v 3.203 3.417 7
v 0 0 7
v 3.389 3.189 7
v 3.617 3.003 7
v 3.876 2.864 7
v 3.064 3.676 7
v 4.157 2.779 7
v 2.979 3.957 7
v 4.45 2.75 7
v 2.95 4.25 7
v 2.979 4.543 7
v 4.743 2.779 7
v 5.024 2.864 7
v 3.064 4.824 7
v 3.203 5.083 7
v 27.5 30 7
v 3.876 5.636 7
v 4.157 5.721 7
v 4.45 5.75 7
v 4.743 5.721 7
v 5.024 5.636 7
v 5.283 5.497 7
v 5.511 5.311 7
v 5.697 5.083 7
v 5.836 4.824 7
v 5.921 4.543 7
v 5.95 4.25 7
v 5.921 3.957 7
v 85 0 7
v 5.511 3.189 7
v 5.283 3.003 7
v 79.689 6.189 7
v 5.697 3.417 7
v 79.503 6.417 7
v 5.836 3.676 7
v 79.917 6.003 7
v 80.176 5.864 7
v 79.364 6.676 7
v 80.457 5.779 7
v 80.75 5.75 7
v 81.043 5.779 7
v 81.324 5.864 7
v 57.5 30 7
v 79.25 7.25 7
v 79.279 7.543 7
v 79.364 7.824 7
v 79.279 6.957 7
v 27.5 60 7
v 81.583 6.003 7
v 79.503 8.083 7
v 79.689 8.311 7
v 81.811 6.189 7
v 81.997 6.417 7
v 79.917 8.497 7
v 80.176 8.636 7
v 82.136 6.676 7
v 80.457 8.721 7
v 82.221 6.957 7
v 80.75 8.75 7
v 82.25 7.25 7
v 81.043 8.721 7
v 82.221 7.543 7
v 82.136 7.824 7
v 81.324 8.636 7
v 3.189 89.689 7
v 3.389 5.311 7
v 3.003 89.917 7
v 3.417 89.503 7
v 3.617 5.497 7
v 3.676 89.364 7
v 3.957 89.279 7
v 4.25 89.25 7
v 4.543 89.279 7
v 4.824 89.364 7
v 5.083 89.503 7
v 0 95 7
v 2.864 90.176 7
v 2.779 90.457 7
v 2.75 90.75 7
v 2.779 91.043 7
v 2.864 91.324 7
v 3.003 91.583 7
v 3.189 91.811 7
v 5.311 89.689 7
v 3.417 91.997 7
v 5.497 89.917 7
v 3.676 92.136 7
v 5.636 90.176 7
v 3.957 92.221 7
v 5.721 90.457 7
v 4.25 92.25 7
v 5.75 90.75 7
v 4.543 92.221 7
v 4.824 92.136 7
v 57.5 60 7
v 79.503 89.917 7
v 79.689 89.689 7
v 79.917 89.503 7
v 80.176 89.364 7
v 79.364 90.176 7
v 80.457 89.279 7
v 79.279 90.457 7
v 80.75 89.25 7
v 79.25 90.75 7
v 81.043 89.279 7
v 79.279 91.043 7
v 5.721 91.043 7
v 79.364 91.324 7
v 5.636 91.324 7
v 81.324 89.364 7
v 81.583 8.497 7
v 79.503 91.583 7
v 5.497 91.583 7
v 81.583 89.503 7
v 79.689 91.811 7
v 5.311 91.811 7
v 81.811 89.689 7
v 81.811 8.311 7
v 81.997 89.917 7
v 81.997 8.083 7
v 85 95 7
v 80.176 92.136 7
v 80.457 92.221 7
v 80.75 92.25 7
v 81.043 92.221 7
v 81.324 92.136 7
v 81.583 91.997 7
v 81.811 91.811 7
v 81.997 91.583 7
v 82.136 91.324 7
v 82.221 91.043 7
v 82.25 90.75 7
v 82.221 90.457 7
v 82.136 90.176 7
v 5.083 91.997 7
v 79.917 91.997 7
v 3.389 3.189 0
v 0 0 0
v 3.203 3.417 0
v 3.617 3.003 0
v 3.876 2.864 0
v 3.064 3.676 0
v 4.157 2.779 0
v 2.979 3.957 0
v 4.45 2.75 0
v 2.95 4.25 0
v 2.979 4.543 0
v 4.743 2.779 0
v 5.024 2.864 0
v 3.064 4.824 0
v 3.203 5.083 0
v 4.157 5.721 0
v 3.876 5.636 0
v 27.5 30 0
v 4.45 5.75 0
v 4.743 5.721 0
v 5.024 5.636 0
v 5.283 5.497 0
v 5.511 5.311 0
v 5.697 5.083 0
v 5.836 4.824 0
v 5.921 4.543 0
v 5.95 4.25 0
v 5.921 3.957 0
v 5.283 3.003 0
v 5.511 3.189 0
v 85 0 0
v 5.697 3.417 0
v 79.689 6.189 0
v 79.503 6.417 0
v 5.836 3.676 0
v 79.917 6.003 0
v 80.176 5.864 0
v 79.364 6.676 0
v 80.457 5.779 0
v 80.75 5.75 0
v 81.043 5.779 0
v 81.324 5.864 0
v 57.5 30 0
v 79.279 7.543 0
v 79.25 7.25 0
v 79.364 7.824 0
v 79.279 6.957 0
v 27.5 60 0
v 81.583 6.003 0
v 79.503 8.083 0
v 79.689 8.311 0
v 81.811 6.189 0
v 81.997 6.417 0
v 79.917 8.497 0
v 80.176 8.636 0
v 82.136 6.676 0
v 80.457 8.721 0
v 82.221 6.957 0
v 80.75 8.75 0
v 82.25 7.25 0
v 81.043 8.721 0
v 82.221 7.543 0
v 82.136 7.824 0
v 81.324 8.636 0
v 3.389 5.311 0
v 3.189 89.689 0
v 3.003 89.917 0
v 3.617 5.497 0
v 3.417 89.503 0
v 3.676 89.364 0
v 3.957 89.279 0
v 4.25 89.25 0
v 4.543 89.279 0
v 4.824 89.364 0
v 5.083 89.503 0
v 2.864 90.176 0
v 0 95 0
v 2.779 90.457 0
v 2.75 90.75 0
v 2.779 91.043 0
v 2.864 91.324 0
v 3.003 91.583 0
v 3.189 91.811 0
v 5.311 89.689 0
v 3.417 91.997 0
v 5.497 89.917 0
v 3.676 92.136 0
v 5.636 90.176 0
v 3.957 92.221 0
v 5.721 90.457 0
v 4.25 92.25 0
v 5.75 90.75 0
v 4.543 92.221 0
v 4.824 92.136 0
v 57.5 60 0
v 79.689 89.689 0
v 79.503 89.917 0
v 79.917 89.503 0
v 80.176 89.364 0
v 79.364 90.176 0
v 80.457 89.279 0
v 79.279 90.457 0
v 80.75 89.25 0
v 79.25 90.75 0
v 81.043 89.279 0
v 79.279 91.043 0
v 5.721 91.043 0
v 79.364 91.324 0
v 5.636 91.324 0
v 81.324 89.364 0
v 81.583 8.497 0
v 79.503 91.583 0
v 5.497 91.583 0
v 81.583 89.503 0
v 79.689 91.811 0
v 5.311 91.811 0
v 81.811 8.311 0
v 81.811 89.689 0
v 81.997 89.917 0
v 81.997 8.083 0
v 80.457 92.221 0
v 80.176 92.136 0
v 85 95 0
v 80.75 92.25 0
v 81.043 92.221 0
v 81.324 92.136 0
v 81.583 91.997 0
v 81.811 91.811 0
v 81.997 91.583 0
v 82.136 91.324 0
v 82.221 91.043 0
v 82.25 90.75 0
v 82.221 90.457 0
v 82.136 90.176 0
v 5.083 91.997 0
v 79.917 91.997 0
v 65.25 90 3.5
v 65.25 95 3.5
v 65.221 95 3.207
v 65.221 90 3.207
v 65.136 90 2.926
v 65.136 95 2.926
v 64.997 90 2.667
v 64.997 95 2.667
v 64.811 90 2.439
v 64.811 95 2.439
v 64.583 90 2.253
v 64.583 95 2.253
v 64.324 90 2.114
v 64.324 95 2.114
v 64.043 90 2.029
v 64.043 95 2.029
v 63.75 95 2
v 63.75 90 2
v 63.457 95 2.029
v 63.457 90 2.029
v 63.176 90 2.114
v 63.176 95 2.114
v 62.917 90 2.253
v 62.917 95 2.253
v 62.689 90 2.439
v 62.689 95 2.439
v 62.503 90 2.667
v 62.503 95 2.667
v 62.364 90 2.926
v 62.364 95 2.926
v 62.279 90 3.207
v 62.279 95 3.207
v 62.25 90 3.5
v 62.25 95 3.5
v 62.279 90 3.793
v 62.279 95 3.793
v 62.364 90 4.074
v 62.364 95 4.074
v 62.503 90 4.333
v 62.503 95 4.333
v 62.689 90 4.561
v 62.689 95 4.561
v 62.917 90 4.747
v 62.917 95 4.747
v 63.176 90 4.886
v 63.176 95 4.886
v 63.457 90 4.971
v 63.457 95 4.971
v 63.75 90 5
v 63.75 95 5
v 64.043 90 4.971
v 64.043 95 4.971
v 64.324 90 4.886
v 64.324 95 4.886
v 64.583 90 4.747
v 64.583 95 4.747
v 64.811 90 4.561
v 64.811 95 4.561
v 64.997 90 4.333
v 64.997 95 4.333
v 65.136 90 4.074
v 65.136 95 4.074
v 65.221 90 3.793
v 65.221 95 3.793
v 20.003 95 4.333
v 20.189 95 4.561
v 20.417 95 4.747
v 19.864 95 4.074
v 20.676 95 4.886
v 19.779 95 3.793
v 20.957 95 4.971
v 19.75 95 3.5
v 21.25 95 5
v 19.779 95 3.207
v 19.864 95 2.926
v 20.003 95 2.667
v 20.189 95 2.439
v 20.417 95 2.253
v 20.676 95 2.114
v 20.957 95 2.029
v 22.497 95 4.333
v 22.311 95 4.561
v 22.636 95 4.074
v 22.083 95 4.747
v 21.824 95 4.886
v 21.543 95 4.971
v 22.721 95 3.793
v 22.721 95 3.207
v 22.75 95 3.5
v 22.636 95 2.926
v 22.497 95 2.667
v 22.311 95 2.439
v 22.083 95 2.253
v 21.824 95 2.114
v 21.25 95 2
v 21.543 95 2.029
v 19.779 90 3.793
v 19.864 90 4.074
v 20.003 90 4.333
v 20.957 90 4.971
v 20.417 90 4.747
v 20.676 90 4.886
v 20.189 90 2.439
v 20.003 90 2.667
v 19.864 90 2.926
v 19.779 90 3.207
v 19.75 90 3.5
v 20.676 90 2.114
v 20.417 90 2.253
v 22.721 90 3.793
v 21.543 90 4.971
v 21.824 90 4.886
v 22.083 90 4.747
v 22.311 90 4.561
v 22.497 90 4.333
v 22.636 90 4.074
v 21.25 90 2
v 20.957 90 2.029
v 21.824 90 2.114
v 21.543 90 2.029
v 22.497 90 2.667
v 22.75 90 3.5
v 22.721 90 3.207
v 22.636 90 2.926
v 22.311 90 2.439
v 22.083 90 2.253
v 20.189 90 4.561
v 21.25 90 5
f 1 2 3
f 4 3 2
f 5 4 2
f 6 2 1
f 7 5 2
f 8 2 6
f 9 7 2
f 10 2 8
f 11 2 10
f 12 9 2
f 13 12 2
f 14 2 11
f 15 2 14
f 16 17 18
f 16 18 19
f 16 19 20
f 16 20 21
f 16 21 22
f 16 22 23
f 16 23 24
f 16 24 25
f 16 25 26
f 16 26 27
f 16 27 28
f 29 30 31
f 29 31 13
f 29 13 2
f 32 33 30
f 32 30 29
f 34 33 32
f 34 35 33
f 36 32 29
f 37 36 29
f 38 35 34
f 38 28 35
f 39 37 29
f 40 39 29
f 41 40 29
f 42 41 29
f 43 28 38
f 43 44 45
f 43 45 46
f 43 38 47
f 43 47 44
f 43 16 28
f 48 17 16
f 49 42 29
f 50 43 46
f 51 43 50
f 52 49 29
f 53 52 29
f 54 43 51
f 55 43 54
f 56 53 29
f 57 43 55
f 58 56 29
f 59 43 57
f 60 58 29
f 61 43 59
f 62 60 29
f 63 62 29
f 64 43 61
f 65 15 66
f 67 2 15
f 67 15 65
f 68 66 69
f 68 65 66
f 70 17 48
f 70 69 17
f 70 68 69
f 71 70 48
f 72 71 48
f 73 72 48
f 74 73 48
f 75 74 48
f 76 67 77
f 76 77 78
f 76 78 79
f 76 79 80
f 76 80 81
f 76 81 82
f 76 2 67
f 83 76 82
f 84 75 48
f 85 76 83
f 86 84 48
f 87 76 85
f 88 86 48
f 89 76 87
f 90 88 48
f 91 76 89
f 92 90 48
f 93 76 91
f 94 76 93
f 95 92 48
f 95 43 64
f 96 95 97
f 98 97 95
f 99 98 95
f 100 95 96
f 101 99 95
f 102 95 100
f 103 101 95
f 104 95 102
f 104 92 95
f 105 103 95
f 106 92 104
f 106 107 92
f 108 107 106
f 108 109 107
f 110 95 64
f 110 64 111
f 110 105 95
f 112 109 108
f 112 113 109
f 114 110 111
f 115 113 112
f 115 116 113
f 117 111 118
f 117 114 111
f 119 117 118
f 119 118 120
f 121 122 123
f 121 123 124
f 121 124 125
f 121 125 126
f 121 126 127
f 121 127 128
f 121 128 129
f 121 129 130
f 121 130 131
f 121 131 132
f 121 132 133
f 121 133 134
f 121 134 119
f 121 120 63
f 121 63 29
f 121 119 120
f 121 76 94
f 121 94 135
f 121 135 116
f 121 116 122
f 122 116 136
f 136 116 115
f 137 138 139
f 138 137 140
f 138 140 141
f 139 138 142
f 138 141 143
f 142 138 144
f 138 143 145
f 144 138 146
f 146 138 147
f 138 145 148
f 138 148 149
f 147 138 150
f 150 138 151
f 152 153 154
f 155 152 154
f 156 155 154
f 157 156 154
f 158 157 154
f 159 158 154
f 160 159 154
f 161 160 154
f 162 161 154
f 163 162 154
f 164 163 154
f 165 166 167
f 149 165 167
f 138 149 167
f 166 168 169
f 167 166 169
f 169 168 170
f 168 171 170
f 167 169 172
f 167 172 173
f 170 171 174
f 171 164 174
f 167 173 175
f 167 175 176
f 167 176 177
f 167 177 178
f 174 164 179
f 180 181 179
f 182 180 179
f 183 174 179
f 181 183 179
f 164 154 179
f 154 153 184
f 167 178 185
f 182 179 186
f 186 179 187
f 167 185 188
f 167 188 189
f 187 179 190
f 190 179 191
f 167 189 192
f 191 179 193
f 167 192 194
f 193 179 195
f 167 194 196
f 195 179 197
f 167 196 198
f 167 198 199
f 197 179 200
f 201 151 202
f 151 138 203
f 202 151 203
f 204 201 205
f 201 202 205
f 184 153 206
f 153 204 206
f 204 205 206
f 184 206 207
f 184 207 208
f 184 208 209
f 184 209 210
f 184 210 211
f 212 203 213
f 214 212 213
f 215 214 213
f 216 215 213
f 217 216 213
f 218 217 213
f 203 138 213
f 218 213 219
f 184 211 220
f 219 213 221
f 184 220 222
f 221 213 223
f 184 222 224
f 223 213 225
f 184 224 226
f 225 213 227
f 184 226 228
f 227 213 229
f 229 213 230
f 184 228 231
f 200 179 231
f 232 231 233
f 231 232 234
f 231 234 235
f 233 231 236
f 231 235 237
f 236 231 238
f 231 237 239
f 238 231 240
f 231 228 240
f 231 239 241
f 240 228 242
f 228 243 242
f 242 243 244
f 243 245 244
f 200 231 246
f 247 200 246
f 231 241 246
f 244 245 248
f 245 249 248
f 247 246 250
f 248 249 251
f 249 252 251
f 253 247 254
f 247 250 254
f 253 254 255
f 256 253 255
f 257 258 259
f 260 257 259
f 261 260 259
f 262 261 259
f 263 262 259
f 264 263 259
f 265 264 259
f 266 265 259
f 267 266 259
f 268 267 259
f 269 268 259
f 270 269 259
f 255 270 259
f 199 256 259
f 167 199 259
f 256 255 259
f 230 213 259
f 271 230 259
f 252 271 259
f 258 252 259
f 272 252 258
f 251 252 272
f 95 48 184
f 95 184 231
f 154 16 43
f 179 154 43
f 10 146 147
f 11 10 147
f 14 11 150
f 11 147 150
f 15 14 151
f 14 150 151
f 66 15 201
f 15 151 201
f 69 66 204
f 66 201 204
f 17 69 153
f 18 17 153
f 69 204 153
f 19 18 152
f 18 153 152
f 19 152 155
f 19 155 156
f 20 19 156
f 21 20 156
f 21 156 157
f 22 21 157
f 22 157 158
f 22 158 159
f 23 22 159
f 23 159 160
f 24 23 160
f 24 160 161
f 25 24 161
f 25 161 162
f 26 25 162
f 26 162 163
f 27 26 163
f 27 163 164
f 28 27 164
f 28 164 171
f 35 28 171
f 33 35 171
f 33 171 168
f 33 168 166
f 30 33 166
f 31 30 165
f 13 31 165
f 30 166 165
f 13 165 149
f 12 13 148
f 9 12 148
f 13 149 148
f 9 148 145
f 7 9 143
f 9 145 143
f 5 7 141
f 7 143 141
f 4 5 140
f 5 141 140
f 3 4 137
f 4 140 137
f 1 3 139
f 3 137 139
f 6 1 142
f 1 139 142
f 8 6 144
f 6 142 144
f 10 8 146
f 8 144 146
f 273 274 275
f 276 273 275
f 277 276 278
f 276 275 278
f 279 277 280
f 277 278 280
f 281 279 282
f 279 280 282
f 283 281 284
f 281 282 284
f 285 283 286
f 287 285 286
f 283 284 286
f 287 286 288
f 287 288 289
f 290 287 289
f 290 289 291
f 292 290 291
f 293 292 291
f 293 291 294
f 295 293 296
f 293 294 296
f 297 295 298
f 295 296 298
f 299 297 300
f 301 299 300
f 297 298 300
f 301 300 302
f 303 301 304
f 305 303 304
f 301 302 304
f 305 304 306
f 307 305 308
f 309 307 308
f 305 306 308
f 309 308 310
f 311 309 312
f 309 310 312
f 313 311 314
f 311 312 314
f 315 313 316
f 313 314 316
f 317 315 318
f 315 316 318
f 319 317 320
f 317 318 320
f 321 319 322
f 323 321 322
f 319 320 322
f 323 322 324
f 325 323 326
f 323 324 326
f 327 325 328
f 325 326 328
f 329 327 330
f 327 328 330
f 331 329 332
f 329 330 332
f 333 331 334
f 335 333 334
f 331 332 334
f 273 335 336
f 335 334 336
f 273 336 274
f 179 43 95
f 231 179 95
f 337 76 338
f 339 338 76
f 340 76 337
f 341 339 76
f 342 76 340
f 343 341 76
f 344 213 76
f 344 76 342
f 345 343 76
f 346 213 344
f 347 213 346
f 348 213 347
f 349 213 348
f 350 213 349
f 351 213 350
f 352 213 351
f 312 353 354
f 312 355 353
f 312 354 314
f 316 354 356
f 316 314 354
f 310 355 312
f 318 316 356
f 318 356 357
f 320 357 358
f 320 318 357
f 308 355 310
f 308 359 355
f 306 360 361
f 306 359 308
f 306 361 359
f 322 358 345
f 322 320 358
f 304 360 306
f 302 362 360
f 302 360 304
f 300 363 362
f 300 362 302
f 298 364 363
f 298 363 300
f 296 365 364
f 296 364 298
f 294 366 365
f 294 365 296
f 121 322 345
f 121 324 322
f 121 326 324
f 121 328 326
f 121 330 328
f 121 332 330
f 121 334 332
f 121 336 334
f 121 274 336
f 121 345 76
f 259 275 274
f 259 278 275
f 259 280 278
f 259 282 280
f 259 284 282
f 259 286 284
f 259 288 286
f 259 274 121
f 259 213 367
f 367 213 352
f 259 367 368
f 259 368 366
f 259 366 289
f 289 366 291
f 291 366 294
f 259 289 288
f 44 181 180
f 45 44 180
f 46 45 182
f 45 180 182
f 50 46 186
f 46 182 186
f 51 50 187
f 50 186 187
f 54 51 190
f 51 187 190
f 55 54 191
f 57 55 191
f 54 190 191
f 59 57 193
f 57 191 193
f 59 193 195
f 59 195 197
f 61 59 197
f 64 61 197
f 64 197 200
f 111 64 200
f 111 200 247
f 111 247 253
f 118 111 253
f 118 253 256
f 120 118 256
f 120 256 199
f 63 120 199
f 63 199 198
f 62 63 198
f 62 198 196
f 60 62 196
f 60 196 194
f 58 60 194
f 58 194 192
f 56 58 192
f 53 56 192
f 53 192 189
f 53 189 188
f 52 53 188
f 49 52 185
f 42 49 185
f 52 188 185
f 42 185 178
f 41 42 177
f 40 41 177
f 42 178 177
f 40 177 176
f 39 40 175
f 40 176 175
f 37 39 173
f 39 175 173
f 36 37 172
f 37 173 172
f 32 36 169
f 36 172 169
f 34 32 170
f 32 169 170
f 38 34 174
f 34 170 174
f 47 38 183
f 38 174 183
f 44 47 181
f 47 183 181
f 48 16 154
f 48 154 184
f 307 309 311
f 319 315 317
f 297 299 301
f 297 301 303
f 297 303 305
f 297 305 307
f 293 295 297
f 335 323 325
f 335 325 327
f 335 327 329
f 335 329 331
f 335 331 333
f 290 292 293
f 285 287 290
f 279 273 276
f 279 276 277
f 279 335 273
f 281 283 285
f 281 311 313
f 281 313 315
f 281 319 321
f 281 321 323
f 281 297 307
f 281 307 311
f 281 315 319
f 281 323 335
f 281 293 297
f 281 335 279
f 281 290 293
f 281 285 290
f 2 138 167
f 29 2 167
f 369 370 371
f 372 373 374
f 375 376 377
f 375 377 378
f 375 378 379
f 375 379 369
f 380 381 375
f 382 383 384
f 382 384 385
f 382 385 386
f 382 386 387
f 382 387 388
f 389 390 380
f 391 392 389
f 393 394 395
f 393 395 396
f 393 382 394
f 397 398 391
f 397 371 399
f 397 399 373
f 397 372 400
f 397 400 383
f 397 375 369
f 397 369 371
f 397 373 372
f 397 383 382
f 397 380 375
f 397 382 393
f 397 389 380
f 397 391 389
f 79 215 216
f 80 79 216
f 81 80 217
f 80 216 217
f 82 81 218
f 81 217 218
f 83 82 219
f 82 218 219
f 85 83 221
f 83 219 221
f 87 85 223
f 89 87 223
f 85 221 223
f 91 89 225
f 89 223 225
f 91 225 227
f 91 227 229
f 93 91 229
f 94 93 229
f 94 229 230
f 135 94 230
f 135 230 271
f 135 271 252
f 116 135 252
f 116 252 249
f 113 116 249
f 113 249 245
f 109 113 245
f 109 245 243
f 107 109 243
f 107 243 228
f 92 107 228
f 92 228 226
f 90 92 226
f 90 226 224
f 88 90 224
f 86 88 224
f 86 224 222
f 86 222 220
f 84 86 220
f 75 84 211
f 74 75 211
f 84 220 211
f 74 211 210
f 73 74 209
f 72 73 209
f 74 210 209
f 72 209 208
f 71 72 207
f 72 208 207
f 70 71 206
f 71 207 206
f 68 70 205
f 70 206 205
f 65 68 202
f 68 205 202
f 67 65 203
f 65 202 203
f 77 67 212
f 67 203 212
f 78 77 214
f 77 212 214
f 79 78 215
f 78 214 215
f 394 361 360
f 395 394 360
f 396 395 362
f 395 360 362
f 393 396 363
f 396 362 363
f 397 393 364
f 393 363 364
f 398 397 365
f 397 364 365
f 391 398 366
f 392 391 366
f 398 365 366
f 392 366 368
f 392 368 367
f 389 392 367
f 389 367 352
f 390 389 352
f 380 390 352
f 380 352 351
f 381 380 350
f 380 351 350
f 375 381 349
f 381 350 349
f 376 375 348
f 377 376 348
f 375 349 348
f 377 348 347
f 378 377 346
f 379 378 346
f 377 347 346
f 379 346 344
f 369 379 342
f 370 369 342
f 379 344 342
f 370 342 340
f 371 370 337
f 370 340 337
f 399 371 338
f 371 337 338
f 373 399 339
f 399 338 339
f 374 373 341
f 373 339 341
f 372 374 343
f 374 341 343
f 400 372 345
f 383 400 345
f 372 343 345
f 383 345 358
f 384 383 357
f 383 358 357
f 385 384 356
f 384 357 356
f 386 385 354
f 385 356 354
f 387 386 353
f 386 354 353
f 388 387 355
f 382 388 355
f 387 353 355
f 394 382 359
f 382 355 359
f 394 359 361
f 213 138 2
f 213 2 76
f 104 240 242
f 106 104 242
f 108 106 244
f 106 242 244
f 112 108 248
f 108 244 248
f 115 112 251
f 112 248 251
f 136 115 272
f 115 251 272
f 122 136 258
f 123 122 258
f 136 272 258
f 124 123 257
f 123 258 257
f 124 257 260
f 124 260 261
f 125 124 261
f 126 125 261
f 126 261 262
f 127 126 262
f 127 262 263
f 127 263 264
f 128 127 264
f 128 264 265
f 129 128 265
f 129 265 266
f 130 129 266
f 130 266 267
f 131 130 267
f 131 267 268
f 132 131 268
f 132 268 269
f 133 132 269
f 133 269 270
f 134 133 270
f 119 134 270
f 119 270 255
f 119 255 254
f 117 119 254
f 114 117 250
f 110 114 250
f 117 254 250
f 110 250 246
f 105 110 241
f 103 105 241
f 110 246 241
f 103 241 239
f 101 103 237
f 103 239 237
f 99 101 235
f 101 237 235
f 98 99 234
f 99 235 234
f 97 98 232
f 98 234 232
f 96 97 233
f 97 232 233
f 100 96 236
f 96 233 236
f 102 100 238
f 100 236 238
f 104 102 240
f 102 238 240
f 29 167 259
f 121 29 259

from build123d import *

# Parameters (mm, degrees)
SKETCH1_W           = 85
SKETCH1_H           = 95
BOSS_EXTRUDE1_DEPTH = 7
SKETCH2_W           = 30
SKETCH2_H           = 30
CUT_EXTRUDE1_DEPTH  = 7
SKETCH4_R           = 1.5
CUT_EXTRUDE2_DEPTH  = 5
SKETCH6_R           = 1.5
CUT_EXTRUDE3_DEPTH  = 8


with BuildPart() as part:
    # Sketch1 → Boss-Extrude1 (new body)
    with BuildSketch(Plane.XY):
        with Locations((42.5, 47.5)):
            Rectangle(SKETCH1_W, SKETCH1_H)
    extrude(amount=BOSS_EXTRUDE1_DEPTH)

    # Sketch2 → Cut-Extrude1 (cut)
    with BuildSketch(Plane.XY.offset(7)):
        with Locations((42.5, 45)):
            Rectangle(SKETCH2_W, SKETCH2_H)
    extrude(amount=-CUT_EXTRUDE1_DEPTH, mode=Mode.SUBTRACT)

    # Sketch4 → Cut-Extrude2 (cut)
    with BuildSketch(Plane(origin=(0, 95, 0), x_dir=(1, 0, 0), z_dir=(0, 1, 0))):
        with Locations((21.25, -3.5)):
            Circle(SKETCH4_R)
        with Locations((63.75, -3.5)):
            Circle(SKETCH4_R)
    extrude(amount=-CUT_EXTRUDE2_DEPTH, mode=Mode.SUBTRACT)

    # Sketch6 → Cut-Extrude3 (cut)
    with BuildSketch(Plane(origin=(0, 0, 0), x_dir=(-1, 0, 0), z_dir=(0, 0, -1))):
        with Locations((-80.75, 90.75)):
            Circle(SKETCH6_R)
        with Locations((-4.25, 90.75)):
            Circle(SKETCH6_R)
        with Locations((-4.45, 4.25)):
            Circle(SKETCH6_R)
        with Locations((-80.75, 7.25)):
            Circle(SKETCH6_R)
    extrude(amount=-CUT_EXTRUDE3_DEPTH, mode=Mode.SUBTRACT)


solid = part.part
